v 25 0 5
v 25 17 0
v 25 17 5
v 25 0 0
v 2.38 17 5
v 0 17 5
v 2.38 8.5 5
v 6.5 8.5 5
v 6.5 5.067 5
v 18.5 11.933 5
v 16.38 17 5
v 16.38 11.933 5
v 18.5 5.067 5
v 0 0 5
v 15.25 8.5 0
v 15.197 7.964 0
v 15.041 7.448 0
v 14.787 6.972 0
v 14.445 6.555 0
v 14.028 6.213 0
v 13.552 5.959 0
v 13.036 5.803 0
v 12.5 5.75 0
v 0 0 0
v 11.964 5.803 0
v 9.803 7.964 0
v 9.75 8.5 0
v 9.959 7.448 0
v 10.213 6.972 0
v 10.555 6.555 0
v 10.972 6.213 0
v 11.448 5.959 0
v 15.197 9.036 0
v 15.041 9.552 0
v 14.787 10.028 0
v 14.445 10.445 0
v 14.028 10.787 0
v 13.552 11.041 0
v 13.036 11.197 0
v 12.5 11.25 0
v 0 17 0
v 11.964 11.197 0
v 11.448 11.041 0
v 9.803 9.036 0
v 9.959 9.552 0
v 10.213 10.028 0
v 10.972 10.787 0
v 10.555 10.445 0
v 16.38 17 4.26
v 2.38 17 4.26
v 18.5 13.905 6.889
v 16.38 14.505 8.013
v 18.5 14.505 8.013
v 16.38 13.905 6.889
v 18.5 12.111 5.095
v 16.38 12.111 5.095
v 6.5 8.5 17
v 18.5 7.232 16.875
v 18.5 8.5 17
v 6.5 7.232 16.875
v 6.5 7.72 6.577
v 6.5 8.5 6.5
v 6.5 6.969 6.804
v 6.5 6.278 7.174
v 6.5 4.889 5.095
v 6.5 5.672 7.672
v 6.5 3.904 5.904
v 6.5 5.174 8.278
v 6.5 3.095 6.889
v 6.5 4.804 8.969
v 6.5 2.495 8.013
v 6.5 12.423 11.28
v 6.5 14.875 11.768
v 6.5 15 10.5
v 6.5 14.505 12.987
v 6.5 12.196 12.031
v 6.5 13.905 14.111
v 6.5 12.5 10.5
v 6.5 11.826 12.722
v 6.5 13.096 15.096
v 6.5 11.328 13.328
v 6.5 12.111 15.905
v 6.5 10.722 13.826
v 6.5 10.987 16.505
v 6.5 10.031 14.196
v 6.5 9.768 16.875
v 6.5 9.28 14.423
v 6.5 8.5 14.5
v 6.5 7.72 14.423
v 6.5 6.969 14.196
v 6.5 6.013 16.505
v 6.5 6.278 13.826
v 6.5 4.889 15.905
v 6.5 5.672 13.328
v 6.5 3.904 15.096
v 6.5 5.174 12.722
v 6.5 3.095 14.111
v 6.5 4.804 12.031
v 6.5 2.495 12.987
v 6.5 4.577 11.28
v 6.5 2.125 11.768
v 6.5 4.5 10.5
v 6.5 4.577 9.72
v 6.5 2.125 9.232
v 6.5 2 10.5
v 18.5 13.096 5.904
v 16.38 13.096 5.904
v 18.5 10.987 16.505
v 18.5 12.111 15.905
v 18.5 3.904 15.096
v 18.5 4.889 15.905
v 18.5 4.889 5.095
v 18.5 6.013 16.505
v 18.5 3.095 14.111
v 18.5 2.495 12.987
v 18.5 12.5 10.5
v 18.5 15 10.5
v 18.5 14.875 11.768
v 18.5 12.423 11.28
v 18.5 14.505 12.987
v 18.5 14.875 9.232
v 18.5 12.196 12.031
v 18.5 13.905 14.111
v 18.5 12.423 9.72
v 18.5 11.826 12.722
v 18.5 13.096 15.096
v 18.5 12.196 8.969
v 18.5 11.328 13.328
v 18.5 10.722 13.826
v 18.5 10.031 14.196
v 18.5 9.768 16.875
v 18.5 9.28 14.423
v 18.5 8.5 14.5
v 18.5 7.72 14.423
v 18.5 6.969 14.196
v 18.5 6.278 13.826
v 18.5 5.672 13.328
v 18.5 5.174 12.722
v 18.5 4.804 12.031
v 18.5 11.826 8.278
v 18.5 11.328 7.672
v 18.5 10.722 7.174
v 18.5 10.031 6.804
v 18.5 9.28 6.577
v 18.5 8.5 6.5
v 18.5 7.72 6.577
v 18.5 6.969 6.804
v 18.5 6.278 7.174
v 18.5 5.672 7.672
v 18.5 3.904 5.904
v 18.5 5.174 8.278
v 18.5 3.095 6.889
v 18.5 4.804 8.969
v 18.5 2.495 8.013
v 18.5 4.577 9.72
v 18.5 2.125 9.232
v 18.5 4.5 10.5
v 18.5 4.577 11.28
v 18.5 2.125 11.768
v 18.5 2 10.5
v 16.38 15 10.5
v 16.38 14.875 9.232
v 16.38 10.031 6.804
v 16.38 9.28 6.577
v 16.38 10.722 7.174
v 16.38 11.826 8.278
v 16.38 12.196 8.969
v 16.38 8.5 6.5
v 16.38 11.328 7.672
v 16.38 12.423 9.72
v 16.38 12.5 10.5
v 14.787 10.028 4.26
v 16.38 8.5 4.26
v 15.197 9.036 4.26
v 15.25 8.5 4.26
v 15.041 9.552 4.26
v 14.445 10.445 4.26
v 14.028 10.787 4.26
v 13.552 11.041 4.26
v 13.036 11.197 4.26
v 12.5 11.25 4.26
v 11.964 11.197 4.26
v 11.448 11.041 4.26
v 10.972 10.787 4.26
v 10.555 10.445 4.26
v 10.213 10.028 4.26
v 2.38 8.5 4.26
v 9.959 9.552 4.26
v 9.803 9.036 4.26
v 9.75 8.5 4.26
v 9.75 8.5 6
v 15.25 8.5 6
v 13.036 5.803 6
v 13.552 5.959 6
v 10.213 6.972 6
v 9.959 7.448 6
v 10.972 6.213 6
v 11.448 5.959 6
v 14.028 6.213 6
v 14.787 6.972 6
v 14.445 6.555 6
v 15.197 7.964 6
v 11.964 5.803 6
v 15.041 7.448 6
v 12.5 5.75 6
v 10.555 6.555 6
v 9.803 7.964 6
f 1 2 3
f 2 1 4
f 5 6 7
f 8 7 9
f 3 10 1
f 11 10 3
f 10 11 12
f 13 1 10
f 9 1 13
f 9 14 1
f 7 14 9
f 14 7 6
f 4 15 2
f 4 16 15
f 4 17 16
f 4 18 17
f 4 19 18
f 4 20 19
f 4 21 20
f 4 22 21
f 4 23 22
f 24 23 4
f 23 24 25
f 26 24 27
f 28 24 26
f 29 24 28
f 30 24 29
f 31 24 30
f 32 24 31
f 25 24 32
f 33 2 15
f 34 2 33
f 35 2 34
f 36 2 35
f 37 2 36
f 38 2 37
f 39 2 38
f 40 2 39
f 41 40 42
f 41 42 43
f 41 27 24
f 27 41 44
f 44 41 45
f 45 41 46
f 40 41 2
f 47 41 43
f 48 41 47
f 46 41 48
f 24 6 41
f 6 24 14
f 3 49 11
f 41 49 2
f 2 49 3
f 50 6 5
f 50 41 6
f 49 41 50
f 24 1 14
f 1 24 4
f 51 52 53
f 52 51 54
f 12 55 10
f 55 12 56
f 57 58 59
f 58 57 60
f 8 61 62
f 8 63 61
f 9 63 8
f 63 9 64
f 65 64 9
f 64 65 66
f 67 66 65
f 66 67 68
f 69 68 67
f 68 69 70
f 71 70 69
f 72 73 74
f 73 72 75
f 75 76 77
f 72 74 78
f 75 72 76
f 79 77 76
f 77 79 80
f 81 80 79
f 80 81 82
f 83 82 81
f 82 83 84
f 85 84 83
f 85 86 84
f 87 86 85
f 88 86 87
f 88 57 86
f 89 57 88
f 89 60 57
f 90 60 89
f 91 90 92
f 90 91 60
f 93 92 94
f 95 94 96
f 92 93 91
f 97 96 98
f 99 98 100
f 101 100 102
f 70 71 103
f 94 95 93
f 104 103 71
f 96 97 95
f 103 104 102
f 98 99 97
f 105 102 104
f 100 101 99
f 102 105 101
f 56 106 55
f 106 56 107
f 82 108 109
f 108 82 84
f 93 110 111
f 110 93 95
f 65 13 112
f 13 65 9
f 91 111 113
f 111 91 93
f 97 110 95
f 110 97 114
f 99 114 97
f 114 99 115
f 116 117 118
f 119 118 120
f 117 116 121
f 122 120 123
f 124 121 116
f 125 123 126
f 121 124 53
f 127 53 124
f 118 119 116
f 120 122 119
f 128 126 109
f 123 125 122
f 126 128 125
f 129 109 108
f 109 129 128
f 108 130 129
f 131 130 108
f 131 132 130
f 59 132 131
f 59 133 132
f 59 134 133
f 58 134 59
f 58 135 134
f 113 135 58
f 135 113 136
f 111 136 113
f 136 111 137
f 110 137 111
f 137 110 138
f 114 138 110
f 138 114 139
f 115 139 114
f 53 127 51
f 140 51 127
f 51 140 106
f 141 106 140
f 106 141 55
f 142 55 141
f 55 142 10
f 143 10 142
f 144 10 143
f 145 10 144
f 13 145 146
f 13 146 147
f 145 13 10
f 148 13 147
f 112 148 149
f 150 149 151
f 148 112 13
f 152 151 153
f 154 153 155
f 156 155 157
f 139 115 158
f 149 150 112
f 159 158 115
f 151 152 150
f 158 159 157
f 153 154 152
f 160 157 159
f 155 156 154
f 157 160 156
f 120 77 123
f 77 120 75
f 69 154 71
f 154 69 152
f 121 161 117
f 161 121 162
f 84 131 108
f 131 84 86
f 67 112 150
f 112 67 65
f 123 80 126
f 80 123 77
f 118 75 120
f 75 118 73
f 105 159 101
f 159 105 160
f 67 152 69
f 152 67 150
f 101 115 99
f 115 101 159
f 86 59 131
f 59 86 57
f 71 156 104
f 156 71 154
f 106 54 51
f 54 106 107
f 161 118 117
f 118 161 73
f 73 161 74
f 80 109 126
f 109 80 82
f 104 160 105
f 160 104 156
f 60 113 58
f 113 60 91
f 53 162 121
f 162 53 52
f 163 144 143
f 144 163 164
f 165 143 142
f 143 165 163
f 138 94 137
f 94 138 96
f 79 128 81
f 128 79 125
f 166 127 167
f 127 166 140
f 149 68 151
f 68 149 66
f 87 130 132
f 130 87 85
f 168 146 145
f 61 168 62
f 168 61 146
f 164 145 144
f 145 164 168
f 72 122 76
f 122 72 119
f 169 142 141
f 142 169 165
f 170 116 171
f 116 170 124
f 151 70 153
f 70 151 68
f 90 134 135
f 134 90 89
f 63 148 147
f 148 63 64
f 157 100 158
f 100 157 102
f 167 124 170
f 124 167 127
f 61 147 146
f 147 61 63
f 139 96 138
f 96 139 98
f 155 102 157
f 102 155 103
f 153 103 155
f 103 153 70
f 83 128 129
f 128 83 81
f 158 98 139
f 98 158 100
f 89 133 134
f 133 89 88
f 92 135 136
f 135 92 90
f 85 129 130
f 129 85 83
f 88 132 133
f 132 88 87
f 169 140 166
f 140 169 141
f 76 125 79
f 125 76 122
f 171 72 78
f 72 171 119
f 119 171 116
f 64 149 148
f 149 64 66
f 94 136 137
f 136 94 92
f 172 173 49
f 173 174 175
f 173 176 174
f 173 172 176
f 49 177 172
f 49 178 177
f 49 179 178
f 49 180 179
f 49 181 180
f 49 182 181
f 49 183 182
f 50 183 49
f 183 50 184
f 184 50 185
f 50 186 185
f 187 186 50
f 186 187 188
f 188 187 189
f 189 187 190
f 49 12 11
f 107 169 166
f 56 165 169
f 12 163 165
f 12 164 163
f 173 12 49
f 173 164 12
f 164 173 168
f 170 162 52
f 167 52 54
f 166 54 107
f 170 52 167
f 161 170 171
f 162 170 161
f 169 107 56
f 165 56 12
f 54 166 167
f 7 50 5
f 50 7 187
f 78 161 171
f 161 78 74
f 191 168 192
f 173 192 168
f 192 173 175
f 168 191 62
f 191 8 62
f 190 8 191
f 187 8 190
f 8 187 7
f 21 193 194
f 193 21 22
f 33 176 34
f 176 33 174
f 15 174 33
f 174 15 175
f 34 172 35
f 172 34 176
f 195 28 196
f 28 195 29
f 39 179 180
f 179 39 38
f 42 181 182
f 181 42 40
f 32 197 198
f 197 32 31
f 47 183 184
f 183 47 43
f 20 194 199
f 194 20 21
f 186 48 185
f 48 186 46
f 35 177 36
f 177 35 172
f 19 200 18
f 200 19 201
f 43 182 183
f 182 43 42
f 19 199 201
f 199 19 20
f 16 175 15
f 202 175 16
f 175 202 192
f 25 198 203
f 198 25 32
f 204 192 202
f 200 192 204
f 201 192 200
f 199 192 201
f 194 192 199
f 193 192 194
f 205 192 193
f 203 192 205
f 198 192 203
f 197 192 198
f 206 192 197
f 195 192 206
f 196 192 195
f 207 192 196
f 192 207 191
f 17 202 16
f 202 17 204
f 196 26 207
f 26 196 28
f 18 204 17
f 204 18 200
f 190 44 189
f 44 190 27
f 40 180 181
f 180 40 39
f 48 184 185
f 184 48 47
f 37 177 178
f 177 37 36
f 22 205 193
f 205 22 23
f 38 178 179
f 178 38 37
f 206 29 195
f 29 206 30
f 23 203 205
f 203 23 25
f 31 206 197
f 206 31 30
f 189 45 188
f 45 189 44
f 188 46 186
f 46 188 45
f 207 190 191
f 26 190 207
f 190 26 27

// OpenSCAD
$fn = 32;

// ----------------------------------------------------------------------
// Cable clip: cable 8 mm, clamp 13 mm, base 25 mm
// ----------------------------------------------------------------------

// --- parameters (mm) ---
foot_w = 25;              // base length, X
foot_d = 17;              // base width, Y
foot_t = 5;               // base thickness
hose_seat_d = 13;         // clamp outside diameter
ring_t = 2.5;             // clamp wall
cable_d = 8;              // cable opening
ring_w = 12;              // clamp width along the cable
screw_d = 5.5;            // screw clearance
throat = 6.24;            // snap throat width
sink = 1;                 // overlap of the clamp into the base

module base() {
  cube([foot_w, foot_d, foot_t]);
}

module clamp() {
  translate([foot_w / 2, foot_d / 2, foot_t + hose_seat_d / 2 - sink]) rotate([0, 90, 0])
    cylinder(h = ring_w, d = hose_seat_d, center = true);
}

difference() {
  union() {
    base();
    clamp();
  }
  translate([foot_w / 2, foot_d / 2, foot_t + hose_seat_d / 2 - sink]) rotate([0, 90, 0]) translate([0, 0, -ring_w / 2 - 1]) cylinder(h = ring_w + 2, d = cable_d);
  /* snap throat: the opening is narrower than the cable */
  translate([foot_w / 2 - throat / 2, foot_d / 2, foot_t + hose_seat_d / 2 - sink]) rotate([0, 90, 0]) translate([0, 0, -ring_w / 2 - 1]) cube([throat, hose_seat_d + 2, ring_w + 2]);
  translate([12.5, foot_d / 2, -1]) cylinder(h = foot_t + 2, d = screw_d);
}
